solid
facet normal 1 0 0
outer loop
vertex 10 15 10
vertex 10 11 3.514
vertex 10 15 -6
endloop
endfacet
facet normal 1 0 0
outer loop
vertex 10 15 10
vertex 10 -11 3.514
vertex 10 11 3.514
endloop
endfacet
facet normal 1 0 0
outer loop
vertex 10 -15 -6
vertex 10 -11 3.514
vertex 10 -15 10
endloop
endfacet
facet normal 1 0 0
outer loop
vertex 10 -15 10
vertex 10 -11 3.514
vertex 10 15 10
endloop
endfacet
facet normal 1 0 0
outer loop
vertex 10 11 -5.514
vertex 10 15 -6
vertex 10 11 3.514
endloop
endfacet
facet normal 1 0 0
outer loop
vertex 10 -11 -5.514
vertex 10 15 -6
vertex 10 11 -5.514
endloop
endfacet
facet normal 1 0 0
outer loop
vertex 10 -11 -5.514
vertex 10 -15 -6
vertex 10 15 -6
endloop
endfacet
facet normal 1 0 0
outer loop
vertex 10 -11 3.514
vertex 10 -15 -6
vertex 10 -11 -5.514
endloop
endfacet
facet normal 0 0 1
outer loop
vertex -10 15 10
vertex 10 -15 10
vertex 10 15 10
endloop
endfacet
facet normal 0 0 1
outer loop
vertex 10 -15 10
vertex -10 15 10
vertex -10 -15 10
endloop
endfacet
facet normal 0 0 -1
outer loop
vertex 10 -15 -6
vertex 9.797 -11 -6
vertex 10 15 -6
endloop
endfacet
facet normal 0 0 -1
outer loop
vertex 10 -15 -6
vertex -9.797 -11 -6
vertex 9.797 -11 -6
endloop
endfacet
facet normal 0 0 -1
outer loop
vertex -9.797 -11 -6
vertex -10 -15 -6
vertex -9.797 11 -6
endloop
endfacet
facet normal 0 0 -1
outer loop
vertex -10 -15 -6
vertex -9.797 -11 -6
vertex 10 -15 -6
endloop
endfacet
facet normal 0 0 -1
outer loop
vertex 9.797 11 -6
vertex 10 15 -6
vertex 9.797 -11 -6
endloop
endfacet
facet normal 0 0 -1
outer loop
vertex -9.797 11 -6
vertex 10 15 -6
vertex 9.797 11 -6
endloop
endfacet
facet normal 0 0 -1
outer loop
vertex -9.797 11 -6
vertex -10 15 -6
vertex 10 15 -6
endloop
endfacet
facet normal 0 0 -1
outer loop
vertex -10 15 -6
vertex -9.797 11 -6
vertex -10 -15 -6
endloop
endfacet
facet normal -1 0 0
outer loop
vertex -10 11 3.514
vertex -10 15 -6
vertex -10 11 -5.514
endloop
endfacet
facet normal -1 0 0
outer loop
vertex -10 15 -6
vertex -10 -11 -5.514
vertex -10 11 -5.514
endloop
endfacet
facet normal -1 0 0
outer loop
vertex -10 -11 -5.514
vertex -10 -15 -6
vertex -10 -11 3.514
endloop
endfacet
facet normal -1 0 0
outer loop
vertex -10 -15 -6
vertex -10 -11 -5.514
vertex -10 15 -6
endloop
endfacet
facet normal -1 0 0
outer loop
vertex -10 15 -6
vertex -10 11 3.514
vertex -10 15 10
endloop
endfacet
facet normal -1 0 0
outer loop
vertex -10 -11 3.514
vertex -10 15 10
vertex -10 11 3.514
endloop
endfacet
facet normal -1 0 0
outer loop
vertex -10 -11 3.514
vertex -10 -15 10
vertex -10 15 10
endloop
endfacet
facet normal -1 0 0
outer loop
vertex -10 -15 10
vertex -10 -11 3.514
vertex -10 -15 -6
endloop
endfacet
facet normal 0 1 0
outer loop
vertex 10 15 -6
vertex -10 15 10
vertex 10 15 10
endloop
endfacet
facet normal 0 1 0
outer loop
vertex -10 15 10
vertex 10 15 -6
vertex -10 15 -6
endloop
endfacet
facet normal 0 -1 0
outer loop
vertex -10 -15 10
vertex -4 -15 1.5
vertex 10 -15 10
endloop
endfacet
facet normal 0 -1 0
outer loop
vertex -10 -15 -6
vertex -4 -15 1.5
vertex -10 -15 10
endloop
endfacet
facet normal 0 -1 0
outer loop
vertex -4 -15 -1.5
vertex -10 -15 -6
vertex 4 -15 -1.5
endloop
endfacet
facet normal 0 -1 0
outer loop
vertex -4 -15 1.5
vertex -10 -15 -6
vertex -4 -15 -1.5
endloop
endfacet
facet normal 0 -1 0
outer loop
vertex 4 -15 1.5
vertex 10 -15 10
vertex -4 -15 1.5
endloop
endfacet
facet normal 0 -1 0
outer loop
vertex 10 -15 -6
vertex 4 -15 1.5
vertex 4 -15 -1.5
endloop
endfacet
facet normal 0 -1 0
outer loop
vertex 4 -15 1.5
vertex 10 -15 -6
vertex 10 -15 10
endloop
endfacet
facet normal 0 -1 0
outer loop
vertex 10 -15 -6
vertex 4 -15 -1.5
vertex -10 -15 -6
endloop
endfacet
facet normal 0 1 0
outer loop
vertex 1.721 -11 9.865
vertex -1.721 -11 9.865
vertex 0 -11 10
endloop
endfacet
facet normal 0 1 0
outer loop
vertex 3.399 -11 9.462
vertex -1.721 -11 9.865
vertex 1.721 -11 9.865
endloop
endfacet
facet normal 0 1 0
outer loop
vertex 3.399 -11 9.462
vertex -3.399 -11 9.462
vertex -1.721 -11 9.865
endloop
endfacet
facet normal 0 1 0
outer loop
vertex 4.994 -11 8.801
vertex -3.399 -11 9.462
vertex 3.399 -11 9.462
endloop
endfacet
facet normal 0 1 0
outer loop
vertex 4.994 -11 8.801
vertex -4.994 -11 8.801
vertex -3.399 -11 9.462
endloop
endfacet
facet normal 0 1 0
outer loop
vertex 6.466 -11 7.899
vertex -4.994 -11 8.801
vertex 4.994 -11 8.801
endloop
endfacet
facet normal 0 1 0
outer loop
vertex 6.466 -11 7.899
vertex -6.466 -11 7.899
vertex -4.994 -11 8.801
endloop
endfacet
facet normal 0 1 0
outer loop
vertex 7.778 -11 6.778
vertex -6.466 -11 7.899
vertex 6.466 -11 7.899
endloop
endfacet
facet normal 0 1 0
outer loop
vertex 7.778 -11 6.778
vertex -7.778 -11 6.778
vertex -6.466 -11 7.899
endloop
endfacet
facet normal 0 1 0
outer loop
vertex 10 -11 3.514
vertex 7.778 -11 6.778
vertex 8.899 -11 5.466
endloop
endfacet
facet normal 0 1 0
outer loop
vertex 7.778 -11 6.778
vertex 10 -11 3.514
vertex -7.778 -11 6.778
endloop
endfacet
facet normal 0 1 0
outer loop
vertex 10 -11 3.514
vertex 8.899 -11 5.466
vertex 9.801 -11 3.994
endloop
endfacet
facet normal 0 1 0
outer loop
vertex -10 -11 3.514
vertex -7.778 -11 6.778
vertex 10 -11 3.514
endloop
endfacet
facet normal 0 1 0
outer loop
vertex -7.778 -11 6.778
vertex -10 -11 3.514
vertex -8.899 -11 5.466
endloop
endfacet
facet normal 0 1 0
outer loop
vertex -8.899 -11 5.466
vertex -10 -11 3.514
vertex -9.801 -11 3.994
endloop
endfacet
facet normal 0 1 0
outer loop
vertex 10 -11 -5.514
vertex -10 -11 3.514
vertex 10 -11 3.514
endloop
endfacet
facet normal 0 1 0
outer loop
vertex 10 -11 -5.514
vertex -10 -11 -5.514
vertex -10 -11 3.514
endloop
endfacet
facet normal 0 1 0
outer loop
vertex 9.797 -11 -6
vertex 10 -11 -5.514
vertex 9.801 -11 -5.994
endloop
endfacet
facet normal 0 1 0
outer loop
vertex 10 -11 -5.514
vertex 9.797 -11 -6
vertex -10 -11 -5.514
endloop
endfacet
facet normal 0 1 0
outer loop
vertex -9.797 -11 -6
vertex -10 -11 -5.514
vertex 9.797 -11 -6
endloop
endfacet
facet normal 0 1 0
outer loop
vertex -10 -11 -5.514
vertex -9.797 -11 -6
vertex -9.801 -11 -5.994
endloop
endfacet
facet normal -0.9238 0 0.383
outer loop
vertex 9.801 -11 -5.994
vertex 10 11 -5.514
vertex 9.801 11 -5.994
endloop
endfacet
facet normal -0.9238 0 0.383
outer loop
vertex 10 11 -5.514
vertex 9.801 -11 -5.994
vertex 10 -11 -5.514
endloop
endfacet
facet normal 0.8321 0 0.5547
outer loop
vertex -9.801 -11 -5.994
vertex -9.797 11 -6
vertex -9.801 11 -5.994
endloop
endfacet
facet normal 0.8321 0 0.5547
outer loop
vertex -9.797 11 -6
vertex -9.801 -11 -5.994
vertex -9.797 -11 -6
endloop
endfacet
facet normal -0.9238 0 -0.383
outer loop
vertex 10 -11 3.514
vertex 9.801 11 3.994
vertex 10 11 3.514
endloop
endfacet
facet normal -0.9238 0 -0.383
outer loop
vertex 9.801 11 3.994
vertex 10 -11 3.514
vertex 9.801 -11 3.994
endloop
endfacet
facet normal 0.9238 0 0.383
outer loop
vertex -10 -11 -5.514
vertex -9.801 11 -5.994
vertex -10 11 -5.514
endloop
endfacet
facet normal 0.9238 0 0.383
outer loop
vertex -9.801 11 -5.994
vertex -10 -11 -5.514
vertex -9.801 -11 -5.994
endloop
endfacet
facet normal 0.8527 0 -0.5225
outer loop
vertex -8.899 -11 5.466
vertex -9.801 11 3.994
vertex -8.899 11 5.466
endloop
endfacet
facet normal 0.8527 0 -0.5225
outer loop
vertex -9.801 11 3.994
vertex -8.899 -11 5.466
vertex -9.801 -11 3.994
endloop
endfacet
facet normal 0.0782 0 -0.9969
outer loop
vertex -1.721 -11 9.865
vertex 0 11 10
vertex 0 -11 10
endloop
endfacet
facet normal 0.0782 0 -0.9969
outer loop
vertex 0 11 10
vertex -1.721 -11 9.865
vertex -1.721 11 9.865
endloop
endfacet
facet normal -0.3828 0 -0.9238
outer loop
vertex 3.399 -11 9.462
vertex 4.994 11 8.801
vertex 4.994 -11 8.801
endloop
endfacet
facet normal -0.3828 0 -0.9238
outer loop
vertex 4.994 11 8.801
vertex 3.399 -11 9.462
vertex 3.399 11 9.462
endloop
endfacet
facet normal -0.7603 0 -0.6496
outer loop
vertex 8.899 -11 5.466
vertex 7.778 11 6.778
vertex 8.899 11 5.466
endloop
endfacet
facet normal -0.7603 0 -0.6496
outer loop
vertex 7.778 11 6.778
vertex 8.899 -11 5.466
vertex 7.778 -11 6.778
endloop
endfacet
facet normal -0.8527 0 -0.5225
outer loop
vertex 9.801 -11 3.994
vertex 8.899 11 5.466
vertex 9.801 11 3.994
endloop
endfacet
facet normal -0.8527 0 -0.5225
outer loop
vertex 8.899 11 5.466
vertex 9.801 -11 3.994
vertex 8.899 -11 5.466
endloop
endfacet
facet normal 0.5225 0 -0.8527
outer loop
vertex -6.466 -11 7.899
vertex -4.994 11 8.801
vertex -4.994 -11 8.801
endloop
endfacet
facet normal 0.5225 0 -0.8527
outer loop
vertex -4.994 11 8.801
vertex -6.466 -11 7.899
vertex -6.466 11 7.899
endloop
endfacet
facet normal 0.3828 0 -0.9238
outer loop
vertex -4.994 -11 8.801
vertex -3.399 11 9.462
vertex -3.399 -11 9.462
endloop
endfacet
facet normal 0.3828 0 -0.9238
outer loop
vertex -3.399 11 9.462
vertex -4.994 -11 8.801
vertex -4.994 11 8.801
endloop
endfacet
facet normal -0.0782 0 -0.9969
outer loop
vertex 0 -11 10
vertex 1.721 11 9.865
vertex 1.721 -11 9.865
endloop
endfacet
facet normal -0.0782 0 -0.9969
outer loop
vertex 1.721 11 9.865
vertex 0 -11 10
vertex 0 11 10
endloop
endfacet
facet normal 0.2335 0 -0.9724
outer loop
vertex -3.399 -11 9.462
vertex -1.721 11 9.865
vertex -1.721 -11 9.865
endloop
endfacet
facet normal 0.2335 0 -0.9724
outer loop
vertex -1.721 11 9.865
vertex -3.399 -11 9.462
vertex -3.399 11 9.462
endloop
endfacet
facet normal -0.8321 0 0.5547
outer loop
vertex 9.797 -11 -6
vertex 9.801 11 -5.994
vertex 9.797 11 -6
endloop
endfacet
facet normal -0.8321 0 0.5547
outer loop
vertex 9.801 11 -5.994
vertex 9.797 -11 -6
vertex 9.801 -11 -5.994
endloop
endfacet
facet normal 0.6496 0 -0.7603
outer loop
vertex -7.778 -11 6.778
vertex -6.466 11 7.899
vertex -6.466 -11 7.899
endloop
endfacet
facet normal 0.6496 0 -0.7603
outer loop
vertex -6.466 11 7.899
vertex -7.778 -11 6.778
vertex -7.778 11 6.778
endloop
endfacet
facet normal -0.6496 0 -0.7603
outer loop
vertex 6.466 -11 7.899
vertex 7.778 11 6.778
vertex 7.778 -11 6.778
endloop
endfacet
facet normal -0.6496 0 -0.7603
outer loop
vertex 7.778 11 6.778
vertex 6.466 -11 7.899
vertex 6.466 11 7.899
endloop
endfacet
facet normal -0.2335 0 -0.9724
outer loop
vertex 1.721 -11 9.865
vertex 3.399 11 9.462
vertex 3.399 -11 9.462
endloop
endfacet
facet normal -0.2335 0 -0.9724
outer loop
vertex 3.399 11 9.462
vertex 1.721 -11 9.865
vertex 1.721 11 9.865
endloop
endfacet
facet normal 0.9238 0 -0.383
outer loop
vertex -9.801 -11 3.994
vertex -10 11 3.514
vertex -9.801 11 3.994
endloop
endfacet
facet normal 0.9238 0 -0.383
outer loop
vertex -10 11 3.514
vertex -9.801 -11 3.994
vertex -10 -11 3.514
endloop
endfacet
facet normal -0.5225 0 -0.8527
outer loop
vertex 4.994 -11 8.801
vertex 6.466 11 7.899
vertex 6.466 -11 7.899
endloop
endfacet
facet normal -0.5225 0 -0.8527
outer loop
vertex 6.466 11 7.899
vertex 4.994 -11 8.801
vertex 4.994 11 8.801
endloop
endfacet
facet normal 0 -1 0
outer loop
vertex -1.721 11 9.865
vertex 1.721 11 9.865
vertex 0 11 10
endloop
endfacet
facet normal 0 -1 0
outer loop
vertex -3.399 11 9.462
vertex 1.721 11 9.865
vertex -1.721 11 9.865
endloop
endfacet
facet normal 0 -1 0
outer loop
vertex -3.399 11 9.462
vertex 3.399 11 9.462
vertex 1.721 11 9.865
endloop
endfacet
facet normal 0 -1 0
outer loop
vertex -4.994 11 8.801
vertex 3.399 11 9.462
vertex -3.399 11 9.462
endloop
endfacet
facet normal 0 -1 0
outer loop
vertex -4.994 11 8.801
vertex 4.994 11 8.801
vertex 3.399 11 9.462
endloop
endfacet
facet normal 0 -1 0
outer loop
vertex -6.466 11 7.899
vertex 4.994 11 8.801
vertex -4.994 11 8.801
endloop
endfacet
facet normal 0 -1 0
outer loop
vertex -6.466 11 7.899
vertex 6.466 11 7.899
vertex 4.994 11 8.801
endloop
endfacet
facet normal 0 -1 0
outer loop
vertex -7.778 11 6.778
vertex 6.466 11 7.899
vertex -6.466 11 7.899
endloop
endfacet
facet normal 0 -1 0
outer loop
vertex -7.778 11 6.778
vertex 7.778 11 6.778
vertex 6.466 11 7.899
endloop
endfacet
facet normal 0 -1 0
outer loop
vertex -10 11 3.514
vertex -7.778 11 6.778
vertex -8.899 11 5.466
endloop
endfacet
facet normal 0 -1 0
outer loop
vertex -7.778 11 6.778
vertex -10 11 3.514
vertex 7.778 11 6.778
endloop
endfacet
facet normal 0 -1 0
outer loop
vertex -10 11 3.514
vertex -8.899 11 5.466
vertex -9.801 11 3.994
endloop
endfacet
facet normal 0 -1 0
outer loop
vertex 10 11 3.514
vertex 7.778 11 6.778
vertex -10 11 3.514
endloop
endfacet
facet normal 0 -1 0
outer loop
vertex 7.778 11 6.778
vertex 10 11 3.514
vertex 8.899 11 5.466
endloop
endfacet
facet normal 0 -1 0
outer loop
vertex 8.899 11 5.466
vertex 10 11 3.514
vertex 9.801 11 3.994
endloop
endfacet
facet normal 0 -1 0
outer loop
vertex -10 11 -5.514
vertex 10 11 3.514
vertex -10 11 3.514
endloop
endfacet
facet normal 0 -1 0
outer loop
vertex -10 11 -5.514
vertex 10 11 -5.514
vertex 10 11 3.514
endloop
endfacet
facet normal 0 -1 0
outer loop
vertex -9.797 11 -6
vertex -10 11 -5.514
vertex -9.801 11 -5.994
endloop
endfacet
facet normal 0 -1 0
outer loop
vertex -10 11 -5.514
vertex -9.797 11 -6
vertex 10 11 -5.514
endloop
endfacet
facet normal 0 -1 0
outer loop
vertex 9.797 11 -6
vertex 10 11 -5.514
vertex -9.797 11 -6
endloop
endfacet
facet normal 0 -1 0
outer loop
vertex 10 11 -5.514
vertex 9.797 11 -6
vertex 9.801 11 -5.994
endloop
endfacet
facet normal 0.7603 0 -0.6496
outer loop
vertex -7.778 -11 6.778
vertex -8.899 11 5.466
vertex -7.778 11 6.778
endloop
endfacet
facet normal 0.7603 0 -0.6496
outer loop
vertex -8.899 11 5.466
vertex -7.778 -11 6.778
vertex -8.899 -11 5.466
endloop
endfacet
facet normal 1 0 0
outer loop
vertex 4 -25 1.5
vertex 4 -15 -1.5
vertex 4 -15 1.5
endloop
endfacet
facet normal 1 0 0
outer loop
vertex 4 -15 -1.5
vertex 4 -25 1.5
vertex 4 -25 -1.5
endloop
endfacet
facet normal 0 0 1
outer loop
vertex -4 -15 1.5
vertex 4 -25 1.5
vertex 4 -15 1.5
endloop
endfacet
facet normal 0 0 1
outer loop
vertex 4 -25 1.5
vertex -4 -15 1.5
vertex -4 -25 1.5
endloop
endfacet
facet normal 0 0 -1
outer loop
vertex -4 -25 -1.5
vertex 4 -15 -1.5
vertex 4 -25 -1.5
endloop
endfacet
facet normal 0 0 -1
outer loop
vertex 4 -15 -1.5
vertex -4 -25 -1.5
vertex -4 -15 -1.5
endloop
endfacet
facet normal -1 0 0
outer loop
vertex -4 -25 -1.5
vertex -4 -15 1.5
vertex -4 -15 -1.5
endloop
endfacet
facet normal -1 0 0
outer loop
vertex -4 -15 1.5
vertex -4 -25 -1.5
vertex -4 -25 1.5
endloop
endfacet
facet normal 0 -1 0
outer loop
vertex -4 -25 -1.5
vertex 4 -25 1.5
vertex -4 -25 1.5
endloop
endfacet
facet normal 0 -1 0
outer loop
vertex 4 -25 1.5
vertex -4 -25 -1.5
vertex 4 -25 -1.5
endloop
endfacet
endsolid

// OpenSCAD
// suport_motor.scad
// Suport d'un motoreductor TT groc estandard (Kit 2) al xassis del vehicle
// (T2, reaprofitat sense canvis al rover T3). Encaixa a la ranura de brida
// del lateral del xassis ("MOTOR ESQUERRE"/"MOTOR DRET" de
// Recursos/plantilles_laser/xassis_vehicle.svg) i abraca el cos rodo del
// motor amb una sella semicircular subjectada amb una brida.
// Material recomanat: PLA. 2 unitats per vehicle (esquerre + dret).

// --- Parametres (mm) ---
diametre_motor = 22;      // diametre del cos rodo del motoreductor TT
gruix_sella = 4;
alcada_sella = 16;        // alcada de la paret que abraca el motor
amplada_sella = 20;       // amplada de la sella (llargada del motor coberta)
tab_amplada = 8;          // ha de coincidir amb la ranura de brida del xassis
tab_fondaria = 10;
gruix_tab = 3;
diametre_forat_brida = 3;  // forat per passar la brida de subjeccio
$fn = 40;

module sella() {
    difference() {
        // paret amb un buit semicircular on reposa el motor
        translate([0, 0, gruix_sella / 2])
            cube([amplada_sella, diametre_motor + gruix_sella * 2, alcada_sella],
                 center = true);
        translate([0, 0, alcada_sella / 2 + gruix_sella / 2 - diametre_motor / 2])
            rotate([90, 0, 0])
                cylinder(h = amplada_sella + 2, d = diametre_motor, center = true);
        // 2 forats per a la brida de subjeccio, per damunt del motor
        translate([-amplada_sella / 2 - 1, 0, alcada_sella - 3])
            rotate([0, 90, 0])
                cylinder(h = amplada_sella + 2, d = diametre_forat_brida);
    }
}

module tab_xassis() {
    // s'insereix a la ranura de brida del xassis (8 x 10 mm)
    translate([0, -(diametre_motor / 2 + gruix_sella + tab_fondaria / 2), 0])
        cube([tab_amplada, tab_fondaria, gruix_tab], center = true);
}

union() {
    sella();
    tab_xassis();
}
